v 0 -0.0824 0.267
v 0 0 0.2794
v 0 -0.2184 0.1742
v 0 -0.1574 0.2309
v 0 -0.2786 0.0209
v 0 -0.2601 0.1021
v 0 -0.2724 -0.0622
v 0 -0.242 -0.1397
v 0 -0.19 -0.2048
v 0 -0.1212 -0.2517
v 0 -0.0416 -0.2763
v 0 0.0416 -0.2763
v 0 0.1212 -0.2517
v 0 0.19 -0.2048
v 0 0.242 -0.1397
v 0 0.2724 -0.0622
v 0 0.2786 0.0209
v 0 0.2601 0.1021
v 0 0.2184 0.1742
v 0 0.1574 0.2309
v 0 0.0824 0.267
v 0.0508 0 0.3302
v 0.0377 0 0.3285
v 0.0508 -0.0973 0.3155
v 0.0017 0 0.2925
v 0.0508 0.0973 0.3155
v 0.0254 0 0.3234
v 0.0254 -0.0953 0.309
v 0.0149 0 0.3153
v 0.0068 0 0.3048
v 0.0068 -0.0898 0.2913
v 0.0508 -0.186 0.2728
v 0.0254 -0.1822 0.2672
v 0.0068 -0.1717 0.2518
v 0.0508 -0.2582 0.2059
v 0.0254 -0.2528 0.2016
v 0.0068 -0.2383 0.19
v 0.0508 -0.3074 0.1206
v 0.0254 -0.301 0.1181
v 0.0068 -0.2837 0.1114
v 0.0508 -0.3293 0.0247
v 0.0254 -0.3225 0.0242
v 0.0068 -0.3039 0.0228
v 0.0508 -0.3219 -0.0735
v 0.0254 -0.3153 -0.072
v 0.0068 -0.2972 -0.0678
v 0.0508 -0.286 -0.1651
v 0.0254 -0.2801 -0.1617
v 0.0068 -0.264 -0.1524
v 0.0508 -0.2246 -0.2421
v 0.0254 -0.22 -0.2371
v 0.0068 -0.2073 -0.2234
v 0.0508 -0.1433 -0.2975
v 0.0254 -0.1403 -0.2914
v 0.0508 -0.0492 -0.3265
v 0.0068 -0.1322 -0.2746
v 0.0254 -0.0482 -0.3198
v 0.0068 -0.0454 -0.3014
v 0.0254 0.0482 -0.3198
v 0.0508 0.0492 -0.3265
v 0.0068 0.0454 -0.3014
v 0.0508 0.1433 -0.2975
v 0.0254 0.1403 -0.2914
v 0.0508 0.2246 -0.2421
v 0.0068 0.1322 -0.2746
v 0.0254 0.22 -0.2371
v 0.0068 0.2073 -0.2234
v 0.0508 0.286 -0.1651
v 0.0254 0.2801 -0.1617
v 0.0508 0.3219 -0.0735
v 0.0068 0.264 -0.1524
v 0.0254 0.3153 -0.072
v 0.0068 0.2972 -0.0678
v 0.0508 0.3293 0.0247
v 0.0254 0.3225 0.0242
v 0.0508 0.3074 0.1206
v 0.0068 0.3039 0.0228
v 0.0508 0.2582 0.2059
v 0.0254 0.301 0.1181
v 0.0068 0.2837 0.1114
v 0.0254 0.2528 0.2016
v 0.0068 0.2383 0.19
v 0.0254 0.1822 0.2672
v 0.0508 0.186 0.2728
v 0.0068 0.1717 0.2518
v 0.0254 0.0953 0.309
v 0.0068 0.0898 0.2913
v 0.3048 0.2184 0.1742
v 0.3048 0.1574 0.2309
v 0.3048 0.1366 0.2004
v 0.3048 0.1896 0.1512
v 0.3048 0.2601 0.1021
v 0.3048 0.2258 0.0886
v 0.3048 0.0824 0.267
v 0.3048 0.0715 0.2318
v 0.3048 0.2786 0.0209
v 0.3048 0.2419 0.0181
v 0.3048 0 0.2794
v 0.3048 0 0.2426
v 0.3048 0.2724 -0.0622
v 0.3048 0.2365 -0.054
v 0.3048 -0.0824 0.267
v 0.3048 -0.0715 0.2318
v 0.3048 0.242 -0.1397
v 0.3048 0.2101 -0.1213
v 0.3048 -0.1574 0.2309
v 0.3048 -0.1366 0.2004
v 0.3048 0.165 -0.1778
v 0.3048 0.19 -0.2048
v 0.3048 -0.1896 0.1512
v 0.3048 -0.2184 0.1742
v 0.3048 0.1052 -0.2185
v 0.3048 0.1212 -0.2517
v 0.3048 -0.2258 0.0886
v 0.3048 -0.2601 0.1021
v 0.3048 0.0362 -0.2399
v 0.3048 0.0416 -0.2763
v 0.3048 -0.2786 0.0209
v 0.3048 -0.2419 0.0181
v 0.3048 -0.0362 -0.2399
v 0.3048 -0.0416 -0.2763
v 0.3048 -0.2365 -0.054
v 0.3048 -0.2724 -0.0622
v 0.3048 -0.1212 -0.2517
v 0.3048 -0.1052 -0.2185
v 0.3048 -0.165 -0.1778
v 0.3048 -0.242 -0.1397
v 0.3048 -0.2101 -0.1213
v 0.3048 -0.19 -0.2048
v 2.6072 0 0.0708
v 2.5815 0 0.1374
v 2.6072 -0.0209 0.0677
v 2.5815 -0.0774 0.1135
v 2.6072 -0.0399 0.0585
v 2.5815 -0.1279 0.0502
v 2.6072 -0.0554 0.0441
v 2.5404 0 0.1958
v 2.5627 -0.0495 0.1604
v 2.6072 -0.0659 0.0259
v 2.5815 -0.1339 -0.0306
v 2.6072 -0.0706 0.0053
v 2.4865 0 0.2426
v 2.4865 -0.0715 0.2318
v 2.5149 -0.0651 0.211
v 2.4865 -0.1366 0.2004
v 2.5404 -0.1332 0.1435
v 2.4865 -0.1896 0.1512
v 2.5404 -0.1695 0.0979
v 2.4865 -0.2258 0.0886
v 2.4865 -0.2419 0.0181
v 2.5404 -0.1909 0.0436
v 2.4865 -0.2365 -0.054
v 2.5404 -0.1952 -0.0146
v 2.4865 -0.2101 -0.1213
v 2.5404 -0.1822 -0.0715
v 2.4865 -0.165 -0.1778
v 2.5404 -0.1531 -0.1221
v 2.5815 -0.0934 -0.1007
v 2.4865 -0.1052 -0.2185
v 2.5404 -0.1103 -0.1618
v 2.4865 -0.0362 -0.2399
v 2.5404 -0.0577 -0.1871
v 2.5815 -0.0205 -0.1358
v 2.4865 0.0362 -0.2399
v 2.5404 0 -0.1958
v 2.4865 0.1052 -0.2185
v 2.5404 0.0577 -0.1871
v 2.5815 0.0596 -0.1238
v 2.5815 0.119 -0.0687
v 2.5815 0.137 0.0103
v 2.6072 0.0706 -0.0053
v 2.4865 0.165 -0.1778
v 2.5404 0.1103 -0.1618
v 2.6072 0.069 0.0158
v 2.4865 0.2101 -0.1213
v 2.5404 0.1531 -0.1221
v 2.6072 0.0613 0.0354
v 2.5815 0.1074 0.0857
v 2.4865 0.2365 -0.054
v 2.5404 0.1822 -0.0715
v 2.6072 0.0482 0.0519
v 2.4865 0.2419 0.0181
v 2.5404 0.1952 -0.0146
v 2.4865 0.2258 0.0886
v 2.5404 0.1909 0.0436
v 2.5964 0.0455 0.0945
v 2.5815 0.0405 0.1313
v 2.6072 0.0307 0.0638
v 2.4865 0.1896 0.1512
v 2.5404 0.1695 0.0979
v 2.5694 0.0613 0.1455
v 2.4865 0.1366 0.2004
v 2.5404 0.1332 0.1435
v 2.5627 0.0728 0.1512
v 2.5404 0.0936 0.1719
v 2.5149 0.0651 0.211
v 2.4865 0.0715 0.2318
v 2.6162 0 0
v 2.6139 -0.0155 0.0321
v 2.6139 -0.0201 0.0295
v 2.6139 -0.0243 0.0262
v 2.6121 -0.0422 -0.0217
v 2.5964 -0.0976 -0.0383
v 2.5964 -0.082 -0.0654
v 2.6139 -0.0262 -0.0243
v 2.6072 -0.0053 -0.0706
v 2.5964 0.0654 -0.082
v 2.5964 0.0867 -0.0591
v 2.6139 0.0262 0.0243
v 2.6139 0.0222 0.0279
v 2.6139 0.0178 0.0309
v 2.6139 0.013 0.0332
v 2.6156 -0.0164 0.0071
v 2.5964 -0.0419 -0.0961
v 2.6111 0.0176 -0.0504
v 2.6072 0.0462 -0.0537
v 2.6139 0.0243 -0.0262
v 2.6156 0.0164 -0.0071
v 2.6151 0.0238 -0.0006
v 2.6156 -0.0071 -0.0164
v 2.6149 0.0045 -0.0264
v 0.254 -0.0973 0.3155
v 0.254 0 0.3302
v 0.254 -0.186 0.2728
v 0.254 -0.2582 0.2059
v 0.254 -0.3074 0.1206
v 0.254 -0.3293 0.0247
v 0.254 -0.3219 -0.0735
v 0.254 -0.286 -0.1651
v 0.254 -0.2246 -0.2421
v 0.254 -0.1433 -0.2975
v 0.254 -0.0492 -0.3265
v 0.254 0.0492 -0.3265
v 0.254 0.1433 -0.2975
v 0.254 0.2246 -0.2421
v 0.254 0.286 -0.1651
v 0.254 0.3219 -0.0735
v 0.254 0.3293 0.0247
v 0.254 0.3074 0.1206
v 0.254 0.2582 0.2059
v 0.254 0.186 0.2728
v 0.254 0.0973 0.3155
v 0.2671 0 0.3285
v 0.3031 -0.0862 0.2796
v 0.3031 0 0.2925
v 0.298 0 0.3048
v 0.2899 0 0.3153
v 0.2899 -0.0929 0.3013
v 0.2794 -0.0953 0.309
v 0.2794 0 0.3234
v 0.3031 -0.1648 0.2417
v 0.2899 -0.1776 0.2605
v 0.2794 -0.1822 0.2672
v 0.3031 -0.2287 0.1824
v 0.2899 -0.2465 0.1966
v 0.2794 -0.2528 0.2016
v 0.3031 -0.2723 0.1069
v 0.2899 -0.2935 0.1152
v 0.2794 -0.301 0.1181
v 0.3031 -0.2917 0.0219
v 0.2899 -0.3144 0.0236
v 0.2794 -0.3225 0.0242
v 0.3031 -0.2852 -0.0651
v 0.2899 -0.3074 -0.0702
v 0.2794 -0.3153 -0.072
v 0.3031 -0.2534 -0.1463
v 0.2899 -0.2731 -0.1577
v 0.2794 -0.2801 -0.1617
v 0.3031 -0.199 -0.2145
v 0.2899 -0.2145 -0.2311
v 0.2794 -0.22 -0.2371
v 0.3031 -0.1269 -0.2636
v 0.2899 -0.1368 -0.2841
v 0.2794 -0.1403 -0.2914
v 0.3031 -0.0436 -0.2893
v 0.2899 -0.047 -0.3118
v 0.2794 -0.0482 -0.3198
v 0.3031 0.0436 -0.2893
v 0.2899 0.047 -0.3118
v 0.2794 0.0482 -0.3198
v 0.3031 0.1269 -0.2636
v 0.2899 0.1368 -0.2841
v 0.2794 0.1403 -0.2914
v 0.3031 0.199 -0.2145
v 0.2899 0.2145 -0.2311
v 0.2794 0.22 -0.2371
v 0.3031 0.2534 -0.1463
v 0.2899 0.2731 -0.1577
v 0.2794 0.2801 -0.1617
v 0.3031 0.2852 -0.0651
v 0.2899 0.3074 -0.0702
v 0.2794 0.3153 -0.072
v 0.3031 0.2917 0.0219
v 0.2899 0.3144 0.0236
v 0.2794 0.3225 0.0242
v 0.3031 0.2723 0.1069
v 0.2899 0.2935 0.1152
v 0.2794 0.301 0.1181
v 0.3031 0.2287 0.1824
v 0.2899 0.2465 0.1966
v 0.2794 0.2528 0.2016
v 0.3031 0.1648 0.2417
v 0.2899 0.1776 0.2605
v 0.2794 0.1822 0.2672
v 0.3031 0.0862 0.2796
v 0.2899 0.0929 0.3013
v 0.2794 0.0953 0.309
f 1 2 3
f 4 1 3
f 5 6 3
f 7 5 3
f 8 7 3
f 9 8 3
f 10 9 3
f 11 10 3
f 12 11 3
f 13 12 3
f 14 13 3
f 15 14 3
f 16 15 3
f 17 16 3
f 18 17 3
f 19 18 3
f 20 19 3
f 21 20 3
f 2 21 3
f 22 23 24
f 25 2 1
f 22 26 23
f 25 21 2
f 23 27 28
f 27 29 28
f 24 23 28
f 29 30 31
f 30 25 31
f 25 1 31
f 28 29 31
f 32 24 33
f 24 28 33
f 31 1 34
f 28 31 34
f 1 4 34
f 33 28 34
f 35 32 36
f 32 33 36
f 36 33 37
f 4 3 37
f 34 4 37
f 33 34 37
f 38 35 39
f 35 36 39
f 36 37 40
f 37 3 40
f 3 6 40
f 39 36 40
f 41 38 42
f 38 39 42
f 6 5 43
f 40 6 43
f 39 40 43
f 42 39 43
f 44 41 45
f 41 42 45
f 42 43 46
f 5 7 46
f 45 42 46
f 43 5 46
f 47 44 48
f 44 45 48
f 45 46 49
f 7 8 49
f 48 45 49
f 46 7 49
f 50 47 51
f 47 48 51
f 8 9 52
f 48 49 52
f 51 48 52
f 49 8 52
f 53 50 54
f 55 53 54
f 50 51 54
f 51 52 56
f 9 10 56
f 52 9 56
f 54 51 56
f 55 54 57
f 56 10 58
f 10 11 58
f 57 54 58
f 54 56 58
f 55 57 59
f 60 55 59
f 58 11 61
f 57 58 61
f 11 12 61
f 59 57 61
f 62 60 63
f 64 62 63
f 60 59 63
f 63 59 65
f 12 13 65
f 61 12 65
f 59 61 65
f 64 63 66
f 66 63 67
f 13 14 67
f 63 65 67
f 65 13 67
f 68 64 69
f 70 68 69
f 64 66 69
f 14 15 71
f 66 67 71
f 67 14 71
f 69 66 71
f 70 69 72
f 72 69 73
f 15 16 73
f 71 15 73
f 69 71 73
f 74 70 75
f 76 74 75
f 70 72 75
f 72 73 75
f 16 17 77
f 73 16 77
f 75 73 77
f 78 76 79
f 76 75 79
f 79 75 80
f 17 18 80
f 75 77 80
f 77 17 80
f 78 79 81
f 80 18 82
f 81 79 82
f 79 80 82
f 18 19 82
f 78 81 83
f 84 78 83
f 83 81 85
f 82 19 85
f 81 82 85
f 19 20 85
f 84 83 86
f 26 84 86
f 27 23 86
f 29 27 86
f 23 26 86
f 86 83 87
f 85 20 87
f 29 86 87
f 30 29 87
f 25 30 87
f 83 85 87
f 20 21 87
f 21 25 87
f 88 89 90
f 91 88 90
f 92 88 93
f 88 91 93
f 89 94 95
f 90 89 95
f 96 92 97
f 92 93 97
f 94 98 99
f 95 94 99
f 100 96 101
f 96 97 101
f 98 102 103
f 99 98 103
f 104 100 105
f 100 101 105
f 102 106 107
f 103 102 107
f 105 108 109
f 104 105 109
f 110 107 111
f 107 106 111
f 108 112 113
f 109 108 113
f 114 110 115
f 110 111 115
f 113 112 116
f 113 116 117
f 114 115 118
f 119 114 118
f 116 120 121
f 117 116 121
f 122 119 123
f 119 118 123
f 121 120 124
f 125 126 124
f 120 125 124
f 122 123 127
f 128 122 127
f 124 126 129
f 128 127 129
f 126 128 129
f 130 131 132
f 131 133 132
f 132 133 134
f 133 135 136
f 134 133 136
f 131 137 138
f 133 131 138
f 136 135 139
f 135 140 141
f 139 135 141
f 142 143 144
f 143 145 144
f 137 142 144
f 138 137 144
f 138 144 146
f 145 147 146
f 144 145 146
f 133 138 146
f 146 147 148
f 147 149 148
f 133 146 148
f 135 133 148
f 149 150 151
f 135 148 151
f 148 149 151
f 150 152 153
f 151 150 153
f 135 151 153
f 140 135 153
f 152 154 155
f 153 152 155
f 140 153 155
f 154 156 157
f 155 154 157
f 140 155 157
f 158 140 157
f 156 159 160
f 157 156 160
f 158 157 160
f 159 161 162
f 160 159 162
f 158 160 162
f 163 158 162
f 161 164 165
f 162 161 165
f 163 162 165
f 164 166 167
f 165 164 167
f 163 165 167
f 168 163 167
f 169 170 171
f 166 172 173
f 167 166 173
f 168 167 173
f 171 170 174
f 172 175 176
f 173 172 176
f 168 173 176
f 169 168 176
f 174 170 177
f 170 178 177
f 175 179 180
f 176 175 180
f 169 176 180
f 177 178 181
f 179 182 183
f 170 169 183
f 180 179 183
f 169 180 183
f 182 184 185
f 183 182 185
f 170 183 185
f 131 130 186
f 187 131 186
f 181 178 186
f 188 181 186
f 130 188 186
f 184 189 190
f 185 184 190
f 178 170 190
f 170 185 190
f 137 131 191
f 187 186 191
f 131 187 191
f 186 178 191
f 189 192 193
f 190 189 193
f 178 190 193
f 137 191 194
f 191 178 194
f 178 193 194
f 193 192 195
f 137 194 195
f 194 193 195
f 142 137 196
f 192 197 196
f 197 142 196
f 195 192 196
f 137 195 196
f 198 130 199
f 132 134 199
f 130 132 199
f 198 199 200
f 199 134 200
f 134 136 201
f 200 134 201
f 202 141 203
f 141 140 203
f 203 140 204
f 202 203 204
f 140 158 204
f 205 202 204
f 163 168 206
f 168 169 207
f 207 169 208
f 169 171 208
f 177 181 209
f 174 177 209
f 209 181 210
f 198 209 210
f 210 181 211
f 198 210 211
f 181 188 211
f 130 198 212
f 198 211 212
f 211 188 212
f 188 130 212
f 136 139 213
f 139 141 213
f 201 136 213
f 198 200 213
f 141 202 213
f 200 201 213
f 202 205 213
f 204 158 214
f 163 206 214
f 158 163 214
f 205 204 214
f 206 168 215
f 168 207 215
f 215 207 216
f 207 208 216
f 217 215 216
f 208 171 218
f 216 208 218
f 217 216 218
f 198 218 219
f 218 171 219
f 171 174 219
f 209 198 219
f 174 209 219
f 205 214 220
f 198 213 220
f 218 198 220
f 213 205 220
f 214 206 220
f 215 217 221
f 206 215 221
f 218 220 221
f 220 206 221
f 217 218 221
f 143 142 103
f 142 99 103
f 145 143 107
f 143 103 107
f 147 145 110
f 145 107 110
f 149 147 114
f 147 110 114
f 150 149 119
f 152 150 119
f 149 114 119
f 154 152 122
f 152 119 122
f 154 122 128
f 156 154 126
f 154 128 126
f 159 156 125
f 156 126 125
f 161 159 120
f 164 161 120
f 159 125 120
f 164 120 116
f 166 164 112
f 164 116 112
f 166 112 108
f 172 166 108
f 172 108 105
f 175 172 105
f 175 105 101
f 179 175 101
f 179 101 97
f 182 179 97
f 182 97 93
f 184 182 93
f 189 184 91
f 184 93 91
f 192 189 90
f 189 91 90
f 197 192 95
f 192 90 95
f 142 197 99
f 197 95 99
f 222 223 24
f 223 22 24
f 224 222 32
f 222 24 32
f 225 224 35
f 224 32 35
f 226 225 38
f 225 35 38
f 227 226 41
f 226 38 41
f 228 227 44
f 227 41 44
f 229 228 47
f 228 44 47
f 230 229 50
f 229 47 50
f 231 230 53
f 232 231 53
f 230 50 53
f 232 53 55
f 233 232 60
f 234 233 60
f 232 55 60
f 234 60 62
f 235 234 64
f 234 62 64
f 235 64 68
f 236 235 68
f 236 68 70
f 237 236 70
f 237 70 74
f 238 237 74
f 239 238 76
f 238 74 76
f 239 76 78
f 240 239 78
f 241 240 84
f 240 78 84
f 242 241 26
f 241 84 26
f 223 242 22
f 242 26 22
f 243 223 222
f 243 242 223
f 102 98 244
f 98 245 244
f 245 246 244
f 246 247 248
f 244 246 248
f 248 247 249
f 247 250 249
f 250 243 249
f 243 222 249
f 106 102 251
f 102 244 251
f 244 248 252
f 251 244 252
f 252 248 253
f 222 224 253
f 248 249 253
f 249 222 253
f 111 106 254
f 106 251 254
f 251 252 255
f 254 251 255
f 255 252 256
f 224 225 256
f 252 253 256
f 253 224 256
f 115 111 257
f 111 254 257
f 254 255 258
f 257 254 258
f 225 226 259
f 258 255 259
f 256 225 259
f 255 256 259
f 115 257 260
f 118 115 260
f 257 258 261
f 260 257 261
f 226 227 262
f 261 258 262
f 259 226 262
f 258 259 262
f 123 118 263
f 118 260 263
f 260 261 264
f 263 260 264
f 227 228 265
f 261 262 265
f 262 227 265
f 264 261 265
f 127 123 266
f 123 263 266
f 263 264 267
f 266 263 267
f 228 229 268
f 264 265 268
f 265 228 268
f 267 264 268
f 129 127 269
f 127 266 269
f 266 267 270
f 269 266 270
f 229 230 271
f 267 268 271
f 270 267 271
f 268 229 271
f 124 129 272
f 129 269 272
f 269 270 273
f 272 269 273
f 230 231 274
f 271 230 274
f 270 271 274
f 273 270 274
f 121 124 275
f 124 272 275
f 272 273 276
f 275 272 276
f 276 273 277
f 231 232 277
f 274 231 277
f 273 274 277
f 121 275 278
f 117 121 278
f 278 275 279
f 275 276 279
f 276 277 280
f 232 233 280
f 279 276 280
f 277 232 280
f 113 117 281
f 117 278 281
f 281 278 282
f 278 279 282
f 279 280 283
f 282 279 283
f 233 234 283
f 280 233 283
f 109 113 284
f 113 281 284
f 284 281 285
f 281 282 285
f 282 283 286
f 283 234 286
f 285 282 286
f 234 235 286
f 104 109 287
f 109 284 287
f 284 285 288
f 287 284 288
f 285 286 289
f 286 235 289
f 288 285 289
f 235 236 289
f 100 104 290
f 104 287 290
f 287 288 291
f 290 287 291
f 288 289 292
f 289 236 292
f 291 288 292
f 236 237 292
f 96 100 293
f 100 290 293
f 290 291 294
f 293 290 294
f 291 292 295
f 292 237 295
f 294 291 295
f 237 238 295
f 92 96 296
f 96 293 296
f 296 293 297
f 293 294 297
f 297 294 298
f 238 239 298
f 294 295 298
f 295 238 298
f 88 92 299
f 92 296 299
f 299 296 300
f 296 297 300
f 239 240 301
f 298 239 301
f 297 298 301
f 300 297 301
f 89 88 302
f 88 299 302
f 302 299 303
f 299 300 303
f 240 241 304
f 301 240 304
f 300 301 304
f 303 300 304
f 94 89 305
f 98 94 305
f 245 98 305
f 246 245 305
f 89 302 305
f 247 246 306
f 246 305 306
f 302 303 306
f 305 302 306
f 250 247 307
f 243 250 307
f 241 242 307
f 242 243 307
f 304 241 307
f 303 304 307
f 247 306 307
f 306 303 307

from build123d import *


with BuildPart() as part:
    # Sketch1 → RevolutionAngle1 (revolve)
    with BuildSketch(Plane.XY, mode=Mode.PRIVATE) as revolutionangle1_sk:
        with BuildLine():
            Line((0, 0), (2.6162, 0))
            ThreePointArc((2.6162, 0), (2.581474496, 0.137373984), (2.486546783, 0.24257))
            Line((2.486546783, 0.24257), (0.3048, 0.24257))
            Line((0.3048, 0.24257), (0.3048, 0.2794))
            ThreePointArc((0.3048, 0.2794), (0.289921024, 0.315321024), (0.254, 0.3302))
            Line((0.254, 0.3302), (0.0508, 0.3302))
            ThreePointArc((0.0508, 0.3302), (0.014878976, 0.315321024), (0, 0.2794))
            Line((0, 0.2794), (0, 0))
        make_face()
    revolve(revolutionangle1_sk.sketch.rotate(Axis((-0.343512289, 0, 0), (1, 0, 0)), 90), axis=Axis((-0.343512289, 0, 0), (1, 0, 0)))


solid = part.part
